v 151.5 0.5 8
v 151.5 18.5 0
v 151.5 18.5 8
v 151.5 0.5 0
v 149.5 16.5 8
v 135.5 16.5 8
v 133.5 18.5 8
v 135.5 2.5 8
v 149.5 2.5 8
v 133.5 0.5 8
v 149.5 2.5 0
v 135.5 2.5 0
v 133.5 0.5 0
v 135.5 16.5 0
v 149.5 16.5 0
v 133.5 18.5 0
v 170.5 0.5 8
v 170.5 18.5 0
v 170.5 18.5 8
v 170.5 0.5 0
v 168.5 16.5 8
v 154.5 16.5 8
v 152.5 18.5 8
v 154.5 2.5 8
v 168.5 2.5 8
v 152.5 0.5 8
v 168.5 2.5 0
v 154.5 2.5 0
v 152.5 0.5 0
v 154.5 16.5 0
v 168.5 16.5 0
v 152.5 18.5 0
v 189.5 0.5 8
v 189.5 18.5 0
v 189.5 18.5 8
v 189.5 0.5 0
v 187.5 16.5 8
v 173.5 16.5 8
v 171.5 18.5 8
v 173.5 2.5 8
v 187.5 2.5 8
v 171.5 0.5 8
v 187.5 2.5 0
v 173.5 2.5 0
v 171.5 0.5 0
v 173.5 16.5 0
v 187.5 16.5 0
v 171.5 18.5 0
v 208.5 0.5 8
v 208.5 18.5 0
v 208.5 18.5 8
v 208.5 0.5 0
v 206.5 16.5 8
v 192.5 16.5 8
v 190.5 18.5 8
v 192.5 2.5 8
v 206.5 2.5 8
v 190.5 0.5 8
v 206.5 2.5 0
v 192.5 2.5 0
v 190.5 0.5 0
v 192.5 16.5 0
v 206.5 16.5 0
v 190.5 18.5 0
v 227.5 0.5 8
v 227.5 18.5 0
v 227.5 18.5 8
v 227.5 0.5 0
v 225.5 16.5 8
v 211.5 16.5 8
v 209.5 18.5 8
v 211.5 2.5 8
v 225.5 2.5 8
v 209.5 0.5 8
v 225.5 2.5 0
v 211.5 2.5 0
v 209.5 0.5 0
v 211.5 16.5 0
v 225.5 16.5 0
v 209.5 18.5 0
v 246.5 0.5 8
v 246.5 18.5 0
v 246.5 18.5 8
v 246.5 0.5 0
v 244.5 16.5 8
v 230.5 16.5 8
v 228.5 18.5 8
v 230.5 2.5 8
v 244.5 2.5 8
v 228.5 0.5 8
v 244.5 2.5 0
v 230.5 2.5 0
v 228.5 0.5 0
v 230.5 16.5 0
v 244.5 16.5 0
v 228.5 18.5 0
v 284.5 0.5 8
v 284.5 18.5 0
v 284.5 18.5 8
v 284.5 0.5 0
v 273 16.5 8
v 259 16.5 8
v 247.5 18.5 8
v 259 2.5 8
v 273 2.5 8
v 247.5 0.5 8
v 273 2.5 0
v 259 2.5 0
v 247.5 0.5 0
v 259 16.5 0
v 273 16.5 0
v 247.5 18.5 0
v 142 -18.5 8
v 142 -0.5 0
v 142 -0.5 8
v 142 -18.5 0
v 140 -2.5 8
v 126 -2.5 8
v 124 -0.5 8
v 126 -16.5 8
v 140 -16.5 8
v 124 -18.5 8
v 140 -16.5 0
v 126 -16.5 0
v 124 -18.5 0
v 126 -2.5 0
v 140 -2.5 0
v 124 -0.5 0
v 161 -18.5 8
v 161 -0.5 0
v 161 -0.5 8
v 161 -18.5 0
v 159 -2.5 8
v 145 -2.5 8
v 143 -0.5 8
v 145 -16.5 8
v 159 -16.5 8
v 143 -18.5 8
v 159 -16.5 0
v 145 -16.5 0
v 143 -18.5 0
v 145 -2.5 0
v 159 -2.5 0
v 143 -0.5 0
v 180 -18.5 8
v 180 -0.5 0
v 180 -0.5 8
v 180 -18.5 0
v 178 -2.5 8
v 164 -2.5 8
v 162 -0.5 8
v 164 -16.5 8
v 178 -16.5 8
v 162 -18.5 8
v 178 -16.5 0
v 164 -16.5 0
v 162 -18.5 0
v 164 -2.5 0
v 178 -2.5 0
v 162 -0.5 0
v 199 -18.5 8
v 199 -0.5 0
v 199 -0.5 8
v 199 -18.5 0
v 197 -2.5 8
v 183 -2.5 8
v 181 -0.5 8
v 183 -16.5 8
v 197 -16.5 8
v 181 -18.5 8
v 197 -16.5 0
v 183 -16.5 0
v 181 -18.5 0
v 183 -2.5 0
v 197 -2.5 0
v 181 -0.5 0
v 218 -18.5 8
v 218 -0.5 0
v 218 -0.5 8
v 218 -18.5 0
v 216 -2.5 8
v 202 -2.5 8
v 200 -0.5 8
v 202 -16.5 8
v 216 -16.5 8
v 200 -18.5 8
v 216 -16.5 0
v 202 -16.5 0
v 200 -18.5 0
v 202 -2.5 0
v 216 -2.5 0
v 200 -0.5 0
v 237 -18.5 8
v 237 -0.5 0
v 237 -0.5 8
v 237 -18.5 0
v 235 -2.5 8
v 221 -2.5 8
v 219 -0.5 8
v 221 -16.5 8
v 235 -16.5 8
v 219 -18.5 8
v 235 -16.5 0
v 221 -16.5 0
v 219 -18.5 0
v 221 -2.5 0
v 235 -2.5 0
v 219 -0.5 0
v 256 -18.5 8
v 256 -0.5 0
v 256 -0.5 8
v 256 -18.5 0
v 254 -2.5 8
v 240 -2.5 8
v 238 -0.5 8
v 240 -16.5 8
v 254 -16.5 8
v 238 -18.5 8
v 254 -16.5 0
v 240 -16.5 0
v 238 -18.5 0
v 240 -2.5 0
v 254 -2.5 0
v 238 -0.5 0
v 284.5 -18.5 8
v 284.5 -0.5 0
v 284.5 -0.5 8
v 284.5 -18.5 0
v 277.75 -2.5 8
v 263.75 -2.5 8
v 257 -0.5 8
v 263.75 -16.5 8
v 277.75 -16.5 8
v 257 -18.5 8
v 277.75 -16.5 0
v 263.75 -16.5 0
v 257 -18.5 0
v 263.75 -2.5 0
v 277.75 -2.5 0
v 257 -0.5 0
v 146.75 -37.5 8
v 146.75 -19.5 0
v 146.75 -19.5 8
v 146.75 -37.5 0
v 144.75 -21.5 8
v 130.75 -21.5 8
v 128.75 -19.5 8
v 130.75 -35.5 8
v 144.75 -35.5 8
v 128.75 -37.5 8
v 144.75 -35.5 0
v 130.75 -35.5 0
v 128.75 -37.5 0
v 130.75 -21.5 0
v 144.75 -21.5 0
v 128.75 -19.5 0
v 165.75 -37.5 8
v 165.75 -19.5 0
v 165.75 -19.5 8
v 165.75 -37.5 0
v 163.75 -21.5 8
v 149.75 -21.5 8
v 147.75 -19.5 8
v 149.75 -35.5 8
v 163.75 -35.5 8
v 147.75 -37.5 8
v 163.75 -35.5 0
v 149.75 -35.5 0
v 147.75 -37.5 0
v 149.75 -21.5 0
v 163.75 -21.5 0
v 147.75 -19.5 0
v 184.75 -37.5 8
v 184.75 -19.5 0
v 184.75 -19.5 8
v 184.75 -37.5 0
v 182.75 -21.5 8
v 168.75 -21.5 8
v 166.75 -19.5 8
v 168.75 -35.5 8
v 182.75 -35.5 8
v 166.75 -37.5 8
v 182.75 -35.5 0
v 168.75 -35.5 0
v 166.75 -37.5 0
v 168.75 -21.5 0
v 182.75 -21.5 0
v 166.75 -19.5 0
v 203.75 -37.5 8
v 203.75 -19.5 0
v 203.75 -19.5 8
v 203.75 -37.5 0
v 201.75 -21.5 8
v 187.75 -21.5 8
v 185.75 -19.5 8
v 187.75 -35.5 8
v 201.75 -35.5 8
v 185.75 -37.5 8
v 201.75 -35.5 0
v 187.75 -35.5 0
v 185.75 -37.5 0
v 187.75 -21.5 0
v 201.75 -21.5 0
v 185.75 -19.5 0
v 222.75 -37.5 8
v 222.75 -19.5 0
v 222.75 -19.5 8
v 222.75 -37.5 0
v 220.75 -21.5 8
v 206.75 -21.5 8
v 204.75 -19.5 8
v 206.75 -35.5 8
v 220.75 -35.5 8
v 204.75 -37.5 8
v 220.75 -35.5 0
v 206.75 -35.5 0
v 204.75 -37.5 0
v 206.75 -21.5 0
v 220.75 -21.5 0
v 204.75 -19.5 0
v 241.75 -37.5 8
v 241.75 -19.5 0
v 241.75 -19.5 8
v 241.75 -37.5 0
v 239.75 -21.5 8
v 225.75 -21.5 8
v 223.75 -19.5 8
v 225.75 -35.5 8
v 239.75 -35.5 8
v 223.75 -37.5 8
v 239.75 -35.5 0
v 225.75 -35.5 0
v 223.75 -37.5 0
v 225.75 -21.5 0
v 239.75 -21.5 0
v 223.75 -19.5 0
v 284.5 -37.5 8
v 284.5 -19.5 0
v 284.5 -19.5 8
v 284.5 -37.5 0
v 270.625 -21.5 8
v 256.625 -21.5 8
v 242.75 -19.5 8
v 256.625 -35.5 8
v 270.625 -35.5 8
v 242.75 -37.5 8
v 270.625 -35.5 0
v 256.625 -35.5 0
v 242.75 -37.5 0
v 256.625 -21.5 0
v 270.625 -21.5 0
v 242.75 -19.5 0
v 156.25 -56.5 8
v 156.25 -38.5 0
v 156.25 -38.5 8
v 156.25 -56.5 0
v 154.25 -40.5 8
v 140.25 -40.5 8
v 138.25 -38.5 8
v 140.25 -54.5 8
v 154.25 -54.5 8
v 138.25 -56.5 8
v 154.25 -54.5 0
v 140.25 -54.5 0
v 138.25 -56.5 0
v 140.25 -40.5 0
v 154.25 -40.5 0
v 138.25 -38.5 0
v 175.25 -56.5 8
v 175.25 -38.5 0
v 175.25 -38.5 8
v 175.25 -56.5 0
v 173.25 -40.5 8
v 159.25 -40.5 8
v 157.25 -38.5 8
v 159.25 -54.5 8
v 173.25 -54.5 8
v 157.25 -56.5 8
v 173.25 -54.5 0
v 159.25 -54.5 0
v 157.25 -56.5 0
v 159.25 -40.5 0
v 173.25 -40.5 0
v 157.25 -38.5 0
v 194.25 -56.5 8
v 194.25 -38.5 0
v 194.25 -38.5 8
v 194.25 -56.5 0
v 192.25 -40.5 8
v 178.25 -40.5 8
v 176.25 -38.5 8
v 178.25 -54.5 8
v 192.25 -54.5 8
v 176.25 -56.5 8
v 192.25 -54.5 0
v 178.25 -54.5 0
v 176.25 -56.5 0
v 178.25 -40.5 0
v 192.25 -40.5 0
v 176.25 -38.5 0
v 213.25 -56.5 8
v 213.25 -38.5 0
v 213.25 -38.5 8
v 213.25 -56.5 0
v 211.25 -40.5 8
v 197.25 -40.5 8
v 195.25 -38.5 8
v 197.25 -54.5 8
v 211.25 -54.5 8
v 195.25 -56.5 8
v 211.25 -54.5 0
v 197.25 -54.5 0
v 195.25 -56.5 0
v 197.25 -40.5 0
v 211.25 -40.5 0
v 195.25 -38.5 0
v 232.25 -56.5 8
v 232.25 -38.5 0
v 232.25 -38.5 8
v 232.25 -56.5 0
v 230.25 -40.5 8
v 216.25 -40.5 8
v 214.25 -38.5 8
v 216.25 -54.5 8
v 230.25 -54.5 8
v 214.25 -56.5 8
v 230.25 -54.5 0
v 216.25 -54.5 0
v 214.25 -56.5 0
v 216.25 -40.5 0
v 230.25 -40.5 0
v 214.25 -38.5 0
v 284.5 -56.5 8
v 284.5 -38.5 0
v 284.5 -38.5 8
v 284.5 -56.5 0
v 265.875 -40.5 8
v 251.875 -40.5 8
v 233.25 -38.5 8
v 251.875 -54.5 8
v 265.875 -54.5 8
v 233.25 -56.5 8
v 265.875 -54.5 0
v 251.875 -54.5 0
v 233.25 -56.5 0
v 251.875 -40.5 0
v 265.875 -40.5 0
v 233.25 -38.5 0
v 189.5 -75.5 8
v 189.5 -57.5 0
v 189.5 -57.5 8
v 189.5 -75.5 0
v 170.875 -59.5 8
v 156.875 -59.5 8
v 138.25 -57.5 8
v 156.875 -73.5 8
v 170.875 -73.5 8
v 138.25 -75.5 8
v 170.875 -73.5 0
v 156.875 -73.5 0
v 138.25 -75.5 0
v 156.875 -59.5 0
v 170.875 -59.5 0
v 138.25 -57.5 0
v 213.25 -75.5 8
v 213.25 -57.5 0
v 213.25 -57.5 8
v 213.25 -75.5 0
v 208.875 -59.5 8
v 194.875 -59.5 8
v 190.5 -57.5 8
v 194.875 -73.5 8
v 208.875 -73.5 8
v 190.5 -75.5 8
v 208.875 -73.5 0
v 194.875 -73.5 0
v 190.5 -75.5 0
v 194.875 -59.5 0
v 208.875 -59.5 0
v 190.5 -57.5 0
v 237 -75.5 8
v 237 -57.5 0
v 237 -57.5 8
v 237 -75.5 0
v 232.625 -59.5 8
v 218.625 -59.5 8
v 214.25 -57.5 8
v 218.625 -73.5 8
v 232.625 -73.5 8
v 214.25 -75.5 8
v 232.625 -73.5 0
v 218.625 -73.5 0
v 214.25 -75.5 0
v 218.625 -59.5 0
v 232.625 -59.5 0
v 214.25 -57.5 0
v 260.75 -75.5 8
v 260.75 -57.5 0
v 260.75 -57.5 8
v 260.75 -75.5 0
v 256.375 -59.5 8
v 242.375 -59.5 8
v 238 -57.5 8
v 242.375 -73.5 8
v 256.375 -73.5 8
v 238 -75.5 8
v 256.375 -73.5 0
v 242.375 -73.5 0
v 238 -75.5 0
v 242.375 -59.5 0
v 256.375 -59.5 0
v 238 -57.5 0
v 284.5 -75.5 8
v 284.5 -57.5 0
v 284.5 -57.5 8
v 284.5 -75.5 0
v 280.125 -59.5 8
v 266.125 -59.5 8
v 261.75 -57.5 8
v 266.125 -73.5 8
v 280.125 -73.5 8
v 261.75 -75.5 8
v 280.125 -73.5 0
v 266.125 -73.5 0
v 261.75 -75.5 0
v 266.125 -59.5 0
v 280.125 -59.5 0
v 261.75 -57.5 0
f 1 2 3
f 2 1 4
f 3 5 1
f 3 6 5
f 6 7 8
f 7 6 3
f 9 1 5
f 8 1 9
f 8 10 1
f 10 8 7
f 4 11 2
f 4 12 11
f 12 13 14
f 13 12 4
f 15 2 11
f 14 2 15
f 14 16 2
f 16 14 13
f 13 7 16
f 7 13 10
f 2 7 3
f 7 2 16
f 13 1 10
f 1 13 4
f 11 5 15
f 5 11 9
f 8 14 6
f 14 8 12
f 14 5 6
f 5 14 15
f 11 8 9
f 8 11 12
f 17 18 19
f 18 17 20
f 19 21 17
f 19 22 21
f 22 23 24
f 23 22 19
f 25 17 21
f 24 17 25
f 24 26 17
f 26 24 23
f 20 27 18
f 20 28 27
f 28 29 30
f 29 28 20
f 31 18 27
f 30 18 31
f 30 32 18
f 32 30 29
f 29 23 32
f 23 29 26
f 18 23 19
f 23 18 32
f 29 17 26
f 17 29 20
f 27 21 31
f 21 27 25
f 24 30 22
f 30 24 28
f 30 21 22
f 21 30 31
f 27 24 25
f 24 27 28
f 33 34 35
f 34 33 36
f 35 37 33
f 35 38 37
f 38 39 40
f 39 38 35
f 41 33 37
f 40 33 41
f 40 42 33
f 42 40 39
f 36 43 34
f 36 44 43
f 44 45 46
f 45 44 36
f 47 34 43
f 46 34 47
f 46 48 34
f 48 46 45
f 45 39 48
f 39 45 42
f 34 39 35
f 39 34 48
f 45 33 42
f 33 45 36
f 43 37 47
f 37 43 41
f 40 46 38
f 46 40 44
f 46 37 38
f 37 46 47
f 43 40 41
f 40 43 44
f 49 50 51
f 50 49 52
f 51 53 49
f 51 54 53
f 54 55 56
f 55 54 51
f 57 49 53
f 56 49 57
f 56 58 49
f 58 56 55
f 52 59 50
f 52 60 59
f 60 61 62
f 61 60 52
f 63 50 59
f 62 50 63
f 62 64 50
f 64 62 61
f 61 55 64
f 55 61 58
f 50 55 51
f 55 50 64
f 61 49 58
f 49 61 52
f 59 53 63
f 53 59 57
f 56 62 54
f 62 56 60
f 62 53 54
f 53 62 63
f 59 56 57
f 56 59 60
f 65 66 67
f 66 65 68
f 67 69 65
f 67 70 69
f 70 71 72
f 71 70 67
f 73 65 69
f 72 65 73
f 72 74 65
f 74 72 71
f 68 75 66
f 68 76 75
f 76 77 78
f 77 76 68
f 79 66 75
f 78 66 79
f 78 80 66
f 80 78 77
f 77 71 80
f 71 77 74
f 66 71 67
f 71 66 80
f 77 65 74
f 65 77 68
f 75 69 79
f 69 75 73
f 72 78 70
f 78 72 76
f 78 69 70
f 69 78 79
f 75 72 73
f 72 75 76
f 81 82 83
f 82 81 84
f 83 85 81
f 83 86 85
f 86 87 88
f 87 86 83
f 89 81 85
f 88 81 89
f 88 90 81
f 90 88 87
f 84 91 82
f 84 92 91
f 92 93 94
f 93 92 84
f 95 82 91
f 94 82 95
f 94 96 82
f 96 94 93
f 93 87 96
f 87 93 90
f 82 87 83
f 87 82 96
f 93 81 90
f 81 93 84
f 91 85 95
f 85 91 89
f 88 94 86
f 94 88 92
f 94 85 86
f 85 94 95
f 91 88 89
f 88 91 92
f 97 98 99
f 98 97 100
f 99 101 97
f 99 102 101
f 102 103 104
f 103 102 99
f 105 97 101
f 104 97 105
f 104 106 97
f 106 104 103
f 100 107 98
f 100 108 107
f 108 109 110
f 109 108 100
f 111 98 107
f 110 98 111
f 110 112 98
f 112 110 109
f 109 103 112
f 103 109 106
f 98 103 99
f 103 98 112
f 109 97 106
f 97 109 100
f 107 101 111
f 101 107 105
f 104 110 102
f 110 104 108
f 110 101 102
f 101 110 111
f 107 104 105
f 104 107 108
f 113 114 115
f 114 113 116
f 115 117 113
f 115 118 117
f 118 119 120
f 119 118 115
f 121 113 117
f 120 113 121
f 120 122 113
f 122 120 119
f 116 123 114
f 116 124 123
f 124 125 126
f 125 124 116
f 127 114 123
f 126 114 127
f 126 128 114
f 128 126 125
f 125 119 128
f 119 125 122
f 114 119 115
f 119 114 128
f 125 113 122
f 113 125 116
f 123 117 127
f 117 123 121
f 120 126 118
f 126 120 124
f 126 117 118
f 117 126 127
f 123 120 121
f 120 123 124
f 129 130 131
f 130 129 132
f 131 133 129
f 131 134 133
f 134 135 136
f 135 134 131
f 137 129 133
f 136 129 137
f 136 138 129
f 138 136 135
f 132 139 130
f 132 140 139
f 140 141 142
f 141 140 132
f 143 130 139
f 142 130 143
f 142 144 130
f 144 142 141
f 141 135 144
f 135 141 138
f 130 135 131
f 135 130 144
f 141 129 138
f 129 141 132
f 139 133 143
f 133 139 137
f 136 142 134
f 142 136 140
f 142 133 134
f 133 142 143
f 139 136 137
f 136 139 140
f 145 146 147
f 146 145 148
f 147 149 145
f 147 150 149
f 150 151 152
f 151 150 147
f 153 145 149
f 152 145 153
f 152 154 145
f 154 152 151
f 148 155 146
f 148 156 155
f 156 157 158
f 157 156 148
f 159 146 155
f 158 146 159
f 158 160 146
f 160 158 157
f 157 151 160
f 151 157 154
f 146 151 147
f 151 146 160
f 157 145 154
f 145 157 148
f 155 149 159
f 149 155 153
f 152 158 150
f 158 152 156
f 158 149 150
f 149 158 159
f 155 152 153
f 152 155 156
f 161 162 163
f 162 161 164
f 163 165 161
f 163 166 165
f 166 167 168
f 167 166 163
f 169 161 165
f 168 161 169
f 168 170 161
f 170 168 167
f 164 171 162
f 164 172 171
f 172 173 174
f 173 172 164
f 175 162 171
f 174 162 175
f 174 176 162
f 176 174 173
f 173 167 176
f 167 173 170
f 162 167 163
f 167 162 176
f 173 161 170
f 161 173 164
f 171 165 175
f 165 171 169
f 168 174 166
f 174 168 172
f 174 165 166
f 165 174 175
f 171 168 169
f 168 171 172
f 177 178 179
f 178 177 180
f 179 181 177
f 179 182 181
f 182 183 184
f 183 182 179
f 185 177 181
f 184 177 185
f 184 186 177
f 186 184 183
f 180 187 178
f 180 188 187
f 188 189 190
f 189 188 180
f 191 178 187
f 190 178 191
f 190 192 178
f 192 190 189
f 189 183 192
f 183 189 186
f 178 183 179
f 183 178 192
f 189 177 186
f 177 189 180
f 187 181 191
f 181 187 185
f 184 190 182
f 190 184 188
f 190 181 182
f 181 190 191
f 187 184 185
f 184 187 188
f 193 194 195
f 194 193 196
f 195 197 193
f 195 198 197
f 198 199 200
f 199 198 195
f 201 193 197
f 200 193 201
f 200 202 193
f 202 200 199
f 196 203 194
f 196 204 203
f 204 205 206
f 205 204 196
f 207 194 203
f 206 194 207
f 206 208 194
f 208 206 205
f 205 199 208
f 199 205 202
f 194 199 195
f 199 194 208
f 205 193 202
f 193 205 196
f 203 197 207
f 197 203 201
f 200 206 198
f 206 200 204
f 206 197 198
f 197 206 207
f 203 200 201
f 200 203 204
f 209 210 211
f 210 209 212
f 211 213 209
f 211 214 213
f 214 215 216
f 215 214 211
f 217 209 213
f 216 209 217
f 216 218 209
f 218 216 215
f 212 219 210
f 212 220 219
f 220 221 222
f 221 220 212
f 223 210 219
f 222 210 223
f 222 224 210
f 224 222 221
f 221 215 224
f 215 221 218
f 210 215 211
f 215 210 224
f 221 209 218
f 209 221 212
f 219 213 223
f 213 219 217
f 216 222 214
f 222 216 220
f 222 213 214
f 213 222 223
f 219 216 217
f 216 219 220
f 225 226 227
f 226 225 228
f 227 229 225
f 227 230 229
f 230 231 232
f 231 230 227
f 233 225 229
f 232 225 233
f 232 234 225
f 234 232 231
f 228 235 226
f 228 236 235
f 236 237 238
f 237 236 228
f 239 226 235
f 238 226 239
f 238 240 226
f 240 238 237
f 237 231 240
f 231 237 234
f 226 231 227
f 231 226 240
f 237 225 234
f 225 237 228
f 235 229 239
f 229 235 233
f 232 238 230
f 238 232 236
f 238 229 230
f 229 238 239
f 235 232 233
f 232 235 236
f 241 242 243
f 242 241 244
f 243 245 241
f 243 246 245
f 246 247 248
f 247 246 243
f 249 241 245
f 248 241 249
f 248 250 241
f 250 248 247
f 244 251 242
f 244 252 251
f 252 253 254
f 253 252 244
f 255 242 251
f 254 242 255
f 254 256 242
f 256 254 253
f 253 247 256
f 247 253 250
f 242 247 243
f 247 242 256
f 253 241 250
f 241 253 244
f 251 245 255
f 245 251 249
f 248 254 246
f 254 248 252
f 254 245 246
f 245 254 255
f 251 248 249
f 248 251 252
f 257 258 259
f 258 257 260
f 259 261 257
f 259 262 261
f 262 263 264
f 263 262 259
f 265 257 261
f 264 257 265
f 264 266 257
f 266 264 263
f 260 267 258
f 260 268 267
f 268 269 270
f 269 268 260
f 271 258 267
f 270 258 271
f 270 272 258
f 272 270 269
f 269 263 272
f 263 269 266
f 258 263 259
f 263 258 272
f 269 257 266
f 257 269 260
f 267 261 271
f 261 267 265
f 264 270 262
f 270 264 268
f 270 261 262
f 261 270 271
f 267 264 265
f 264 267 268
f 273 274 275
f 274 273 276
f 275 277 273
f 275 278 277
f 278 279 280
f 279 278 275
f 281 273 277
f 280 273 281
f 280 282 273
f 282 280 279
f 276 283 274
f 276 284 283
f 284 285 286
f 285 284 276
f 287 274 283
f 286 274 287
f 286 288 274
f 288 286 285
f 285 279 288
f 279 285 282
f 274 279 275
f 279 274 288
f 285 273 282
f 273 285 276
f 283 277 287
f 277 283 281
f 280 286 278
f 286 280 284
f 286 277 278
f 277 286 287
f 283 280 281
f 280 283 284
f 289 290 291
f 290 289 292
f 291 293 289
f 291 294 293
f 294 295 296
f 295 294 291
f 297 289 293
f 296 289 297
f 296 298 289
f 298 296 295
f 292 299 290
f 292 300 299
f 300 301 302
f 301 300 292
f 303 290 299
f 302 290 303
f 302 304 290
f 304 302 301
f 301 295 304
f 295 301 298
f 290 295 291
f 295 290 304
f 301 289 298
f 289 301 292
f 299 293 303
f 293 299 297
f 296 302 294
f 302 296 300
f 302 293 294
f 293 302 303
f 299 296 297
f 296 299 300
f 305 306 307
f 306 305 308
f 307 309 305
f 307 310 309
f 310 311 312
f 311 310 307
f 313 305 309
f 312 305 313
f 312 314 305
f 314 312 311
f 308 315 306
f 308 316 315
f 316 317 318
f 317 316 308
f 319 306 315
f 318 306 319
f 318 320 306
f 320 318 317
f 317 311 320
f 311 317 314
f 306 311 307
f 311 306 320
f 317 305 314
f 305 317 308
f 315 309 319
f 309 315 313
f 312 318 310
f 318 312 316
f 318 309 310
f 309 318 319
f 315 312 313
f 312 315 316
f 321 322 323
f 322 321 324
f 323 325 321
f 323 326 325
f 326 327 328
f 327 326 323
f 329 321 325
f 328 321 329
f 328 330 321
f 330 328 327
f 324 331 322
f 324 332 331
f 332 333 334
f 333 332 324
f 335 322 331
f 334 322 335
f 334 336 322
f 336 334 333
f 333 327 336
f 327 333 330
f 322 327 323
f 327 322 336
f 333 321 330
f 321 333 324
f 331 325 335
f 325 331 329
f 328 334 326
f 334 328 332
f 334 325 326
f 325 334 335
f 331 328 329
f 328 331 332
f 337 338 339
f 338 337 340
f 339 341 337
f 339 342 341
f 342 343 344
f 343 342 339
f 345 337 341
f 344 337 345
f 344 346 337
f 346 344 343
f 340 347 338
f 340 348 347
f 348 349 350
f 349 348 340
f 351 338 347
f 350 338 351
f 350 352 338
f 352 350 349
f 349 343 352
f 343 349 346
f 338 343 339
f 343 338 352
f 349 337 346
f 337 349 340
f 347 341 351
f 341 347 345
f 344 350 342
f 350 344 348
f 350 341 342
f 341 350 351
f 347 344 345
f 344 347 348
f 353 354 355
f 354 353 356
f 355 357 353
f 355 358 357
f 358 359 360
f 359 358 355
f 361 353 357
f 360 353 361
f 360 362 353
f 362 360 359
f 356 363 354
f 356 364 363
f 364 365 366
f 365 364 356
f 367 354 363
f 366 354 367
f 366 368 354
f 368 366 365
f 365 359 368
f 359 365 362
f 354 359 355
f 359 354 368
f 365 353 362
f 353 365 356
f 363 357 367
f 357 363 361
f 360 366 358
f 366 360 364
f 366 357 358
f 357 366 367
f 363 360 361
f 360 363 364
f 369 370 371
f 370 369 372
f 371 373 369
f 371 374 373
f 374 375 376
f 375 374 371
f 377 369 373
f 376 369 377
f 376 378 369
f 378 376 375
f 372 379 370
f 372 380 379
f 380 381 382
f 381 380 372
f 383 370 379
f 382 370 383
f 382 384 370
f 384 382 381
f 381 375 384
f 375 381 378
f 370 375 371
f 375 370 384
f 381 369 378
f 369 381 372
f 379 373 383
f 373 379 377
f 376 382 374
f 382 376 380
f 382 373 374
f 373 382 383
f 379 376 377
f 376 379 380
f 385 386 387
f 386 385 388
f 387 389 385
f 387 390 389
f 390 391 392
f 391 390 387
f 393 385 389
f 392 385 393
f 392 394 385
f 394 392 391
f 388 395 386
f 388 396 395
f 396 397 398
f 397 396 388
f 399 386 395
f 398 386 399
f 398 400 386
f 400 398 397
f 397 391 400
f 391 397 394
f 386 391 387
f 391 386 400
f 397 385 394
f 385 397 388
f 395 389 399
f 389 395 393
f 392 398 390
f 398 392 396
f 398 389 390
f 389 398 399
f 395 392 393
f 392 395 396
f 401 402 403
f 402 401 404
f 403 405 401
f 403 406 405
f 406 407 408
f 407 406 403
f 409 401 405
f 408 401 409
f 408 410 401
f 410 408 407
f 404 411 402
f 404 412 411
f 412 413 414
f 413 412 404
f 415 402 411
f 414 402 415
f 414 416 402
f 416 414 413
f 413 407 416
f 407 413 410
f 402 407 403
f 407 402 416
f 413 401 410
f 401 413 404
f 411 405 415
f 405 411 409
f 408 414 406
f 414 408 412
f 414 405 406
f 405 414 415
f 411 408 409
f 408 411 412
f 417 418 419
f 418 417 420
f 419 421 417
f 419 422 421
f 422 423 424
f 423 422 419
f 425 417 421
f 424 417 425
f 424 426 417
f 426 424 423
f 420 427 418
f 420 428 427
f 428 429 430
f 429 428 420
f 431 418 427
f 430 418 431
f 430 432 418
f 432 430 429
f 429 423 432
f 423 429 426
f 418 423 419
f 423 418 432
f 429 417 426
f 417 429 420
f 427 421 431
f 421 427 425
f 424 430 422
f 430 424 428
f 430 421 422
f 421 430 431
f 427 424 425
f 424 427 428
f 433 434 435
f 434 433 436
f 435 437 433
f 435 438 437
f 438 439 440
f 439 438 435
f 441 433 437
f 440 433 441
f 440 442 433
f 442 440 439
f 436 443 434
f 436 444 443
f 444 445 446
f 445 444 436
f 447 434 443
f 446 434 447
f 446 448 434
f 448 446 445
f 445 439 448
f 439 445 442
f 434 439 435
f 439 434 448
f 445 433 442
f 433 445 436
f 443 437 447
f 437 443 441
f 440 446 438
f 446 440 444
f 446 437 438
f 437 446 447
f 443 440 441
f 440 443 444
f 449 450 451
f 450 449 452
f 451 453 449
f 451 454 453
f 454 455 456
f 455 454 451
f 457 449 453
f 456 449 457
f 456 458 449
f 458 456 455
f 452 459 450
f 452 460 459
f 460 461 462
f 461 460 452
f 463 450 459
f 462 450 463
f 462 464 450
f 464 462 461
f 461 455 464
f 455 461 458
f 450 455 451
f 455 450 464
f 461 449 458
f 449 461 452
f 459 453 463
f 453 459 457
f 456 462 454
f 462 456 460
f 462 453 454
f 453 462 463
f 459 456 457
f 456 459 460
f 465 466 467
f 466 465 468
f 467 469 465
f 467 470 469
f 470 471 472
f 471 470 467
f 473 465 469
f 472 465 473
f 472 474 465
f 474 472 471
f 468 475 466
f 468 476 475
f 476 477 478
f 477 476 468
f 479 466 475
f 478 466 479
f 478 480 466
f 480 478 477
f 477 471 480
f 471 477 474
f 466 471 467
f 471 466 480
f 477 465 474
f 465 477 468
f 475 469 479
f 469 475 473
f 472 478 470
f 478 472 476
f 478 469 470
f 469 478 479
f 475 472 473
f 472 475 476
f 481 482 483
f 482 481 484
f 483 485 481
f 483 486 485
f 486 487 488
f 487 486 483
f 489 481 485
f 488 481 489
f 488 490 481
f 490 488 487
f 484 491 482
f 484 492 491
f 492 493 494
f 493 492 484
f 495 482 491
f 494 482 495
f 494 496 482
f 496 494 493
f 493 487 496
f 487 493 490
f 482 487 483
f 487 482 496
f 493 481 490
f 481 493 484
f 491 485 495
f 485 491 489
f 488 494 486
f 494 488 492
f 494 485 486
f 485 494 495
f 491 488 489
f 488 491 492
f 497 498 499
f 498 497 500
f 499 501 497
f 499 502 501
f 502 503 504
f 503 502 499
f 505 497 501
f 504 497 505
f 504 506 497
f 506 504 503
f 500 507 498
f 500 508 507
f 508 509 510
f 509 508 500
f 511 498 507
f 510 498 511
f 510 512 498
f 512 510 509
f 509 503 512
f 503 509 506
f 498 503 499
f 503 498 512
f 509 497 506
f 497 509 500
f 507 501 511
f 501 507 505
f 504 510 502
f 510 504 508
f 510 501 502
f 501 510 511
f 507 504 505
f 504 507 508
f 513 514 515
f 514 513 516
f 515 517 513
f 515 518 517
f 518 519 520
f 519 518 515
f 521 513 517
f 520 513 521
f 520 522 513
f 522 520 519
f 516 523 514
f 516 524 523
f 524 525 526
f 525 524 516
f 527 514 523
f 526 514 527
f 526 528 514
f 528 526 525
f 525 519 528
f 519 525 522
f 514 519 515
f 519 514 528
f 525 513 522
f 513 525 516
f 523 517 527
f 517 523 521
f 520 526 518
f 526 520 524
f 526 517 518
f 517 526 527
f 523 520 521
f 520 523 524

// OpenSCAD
// Keyboard Layout Visualization in OpenSCAD

// --- Constants ---
u = 19;         // Standard key unit size (mm)
gap = 1;        // Gap between keys (actual key dimension = u - gap)
key_height = 8; // Height of the keycap base
text_depth = 0.5; // How much the text sticks out from the surface
text_size = 3.5;  // Font size for legends
key_color = [0.8, 0.8, 0.8]; // Light grey for keycaps
text_color = [0.1, 0.1, 0.1]; // Dark grey/black for text
font = "Liberation Sans:style=Bold"; // Choose a font available on your system

// --- Key Data ---
// Format: [ TopLegend, BottomLegend, x_start_units, y_row_index, width_units ]
// Derived from the input structure.
key_data = [
  // Row 0 (y=0) - Function/Number Row
  [ "~", "`", 0, 0, 1 ], [ "!", "1", 1, 0, 1 ], [ "@", "2", 2, 0, 1 ], [ "#", "3", 3, 0, 1 ], [ "$", "4", 4, 0, 1 ], [ "%", "5", 5, 0, 1 ], [ "^", "6", 6, 0, 1 ], [ "&", "7", 7, 0, 1 ], [ "*", "8", 8, 0, 1 ], [ "(", "9", 9, 0, 1 ], [ ")", "0", 10, 0, 1 ], [ "_", "-", 11, 0, 1 ], [ "+", "=", 12, 0, 1 ], [ "", "Backspace", 13, 0, 2 ],
  // Row 1 (y=-1) - QWERTY Row
  [ "", "Tab", 0, -1, 1.5 ], [ "", "Q", 1.5, -1, 1 ], [ "", "W", 2.5, -1, 1 ], [ "", "E", 3.5, -1, 1 ], [ "", "R", 4.5, -1, 1 ], [ "", "T", 5.5, -1, 1 ], [ "", "Y", 6.5, -1, 1 ], [ "", "U", 7.5, -1, 1 ], [ "", "I", 8.5, -1, 1 ], [ "", "O", 9.5, -1, 1 ], [ "", "P", 10.5, -1, 1 ], [ "{", "[", 11.5, -1, 1 ], [ "}", "]", 12.5, -1, 1 ], [ "|", "\\", 13.5, -1, 1.5 ],
  // Row 2 (y=-2) - ASDF Row (Home)
  [ "", "Caps Lock", 0, -2, 1.75 ], [ "", "A", 1.75, -2, 1 ], [ "", "S", 2.75, -2, 1 ], [ "", "D", 3.75, -2, 1 ], [ "", "F", 4.75, -2, 1 ], [ "", "G", 5.75, -2, 1 ], [ "", "H", 6.75, -2, 1 ], [ "", "J", 7.75, -2, 1 ], [ "", "K", 8.75, -2, 1 ], [ "", "L", 9.75, -2, 1 ], [ ":", ";", 10.75, -2, 1 ], [ "\"", "'", 11.75, -2, 1 ], [ "", "Enter", 12.75, -2, 2.25 ],
  // Row 3 (y=-3) - ZXCV Row
  [ "", "Shift", 0, -3, 2.25 ], [ "", "Z", 2.25, -3, 1 ], [ "", "X", 3.25, -3, 1 ], [ "", "C", 4.25, -3, 1 ], [ "", "V", 5.25, -3, 1 ], [ "", "B", 6.25, -3, 1 ], [ "", "N", 7.25, -3, 1 ], [ "", "M", 8.25, -3, 1 ], [ "<", ",", 9.25, -3, 1 ], [ ">", ".", 10.25, -3, 1 ], [ "?", "/", 11.25, -3, 1 ], [ "", "Shift", 12.25, -3, 2.75 ],
  // Row 4 (y=-4) - Bottom Modifiers Row
  [ "", "Ctrl", 0, -4, 1.25 ], [ "", "Win", 1.25, -4, 1.25 ], [ "", "Alt", 2.5, -4, 1.25 ], [ "", "", 3.75, -4, 6.25 ], // Space bar (no legend)
  [ "", "Alt", 10, -4, 1.25 ], [ "", "Win", 11.25, -4, 1.25 ], [ "", "Menu", 12.5, -4, 1.25 ], [ "", "Ctrl", 13.75, -4, 1.25 ]
];

// --- Module to draw a single keycap ---
module keycap(top_lg = "", btm_lg = "", width_u = 1, depth_u = 1, pos = [0,0,0]) {
    key_w = width_u * u - gap;
    key_d = depth_u * u - gap;

    // Calculate center position for the key relative to its bottom-left corner (pos)
    center_x = pos[0] + (width_u * u / 2);
    center_y = pos[1] + (depth_u * u / 2); // OpenSCAD Y is depth
    center_z = pos[2] + key_height / 2;

    // Position for text on top surface
    text_pos_z = pos[2] + key_height + 0.01; // Place slightly above surface

    translate([center_x, center_y, center_z]) {
        // Keycap Base
        color(key_color)
            cube([key_w, key_d, key_height], center=true);

        // Determine Legend Positions
        has_top = (top_lg != "");
        has_btm = (btm_lg != "");
        text_y_offset = (has_top && has_btm) ? key_d * 0.22 : 0; // Offset for two lines
        btm_text_y = (has_top && has_btm) ? -text_y_offset : 0;
        top_text_y = (has_btm && has_top) ? text_y_offset : (has_top ? 0 : btm_text_y); // Center single legend

        // Bottom Legend Text
        if (has_btm) {
            translate([0, btm_text_y, key_height/2 + text_depth/2]) // Adjusted Z for text depth
            color(text_color)
            linear_extrude(height = text_depth, center=true) // Extrude text
                text(btm_lg, size = text_size, halign = "center", valign = "center", font = font);
        }

        // Top Legend Text
        if (has_top) {
             translate([0, top_text_y, key_height/2 + text_depth/2]) // Adjusted Z for text depth
             color(text_color)
             linear_extrude(height = text_depth, center=true) // Extrude text
                text(top_lg, size = text_size, halign = "center", valign = "center", font = font);
        }
    }
}


// --- Main part - Generate all keys ---
module keyboard() {
     for (key = key_data) {
        top_lg = key[0];
        btm_lg = key[1];
        x_pos_u = key[2];
        y_row_idx = key[3]; // Use negative index directly
        width_u = key[4];

        // Calculate bottom-left position for the key
        // We use negative Y to match screen coordinates (top row is y=0)
        key_pos = [ x_pos_u * u, y_row_idx * u, 0 ];

        keycap(top_lg, btm_lg, width_u, 1, key_pos); // Assuming depth_u is always 1
    }
}



// --- Render the keyboard ---
keyboard();

// Optional: Add a base plate (uncomment to see)
/*
 module base_plate(rows=5, total_width_u=15) {
     plate_width = total_width_u * u + gap;
     plate_depth = rows * u + gap;
     plate_thickness = 2;
     
     translate([-gap/2, - (rows * u) + u - gap/2, -plate_thickness]) {
        color([0.3, 0.3, 0.3]) 
            cube([plate_width, plate_depth, plate_thickness]);
     }
 }
 
 base_plate(5, 15); // Adjust parameters if layout changes significantly
*/



// Keyboard Layout Visualization in OpenSCAD - Left Hand Keys Only

// --- Constants ---
u = 19;         // Standard key unit size (mm)
gap = 1;        // Gap between keys (actual key dimension = u - gap)
key_height = 8; // Height of the keycap base
key_color = [0.8, 0.8, 0.8]; // Light grey for keycaps
hole_size = 14; // Size of the square hole side (mm)

// --- Left Hand Key Data ---
// Format: [ "", "", x_start_units, y_row_index, width_units ]
// Contains only keys typically typed by the left hand.
left_key_data = [
  // Row 0 (y=0)
  [ "", "", 0, 0, 1 ], [ "", "", 1, 0, 1 ], [ "", "", 2, 0, 1 ], [ "", "", 3, 0, 1 ], [ "", "", 4, 0, 1 ], [ "", "", 5, 0, 1 ], [ "", "", 6, 0, 1 ],
  // Row 1 (y=-1)
  [ "", "", 0, -1, 1.5 ], [ "", "", 1.5, -1, 1 ], [ "", "", 2.5, -1, 1 ], [ "", "", 3.5, -1, 1 ], [ "", "", 4.5, -1, 1 ], [ "", "", 5.5, -1, 1 ],
  // Row 2 (y=-2)
  [ "", "", 0, -2, 1.75 ], [ "", "", 1.75, -2, 1 ], [ "", "", 2.75, -2, 1 ], [ "", "", 3.75, -2, 1 ], [ "", "", 4.75, -2, 1 ], [ "", "", 5.75, -2, 1 ],
  // Row 3 (y=-3)
  [ "", "", 0, -3, 2.25 ], [ "", "", 2.25, -3, 1 ], [ "", "", 3.25, -3, 1 ], [ "", "", 4.25, -3, 1 ], [ "", "", 5.25, -3, 1 ], [ "", "", 6.25, -3, 1 ],
  // Row 4 (y=-4)
  [ "", "", 0, -4, 1.25 ], [ "", "", 1.25, -4, 1.25 ], [ "", "", 2.5, -4, 1.25 ],
  [ "", "", 3.75, -4, 3.5 ] // Left part of Space bar
];

// --- Module to draw a single keycap ---
module keycap(width_u = 1, depth_u = 1, pos = [0,0,0]) {
    key_w = width_u * u - gap;
    key_d = depth_u * u - gap;

    // Calculate center position for the key relative to its bottom-left corner (pos)
    center_x = pos[0] + (width_u * u / 2);
    center_y = pos[1] + (depth_u * u / 2); // OpenSCAD Y is depth
    center_z = pos[2] + key_height / 2;

    translate([center_x, center_y, center_z]) {
        // Use difference() to subtract the hole from the keycap base
        difference() {
            // Keycap Base Cube
            color(key_color)
                cube([key_w, key_d, key_height], center=true);

            // Square prism (cube) for the hole
            // Make it slightly taller than key_height to ensure clean cut
            cube([hole_size, hole_size, key_height + 2], center=true);
        }
    }
}


// --- Main part - Generate Left Hand keys ---
module keyboard() {
     // Iterate over the left_key_data only
     for (key = left_key_data) {
        x_pos_u = key[2];
        y_row_idx = key[3]; // Use negative index directly
        width_u = key[4];

        // Calculate bottom-left position for the key
        key_pos = [ x_pos_u * u, y_row_idx * u, 0 ];

        // Call keycap
        keycap(width_u, 1, key_pos); // Assuming depth_u is always 1
    }
}

// --- Render the keyboard ---
keyboard();

// Optional: Add a base plate (uncomment to see and adjust)
/*
 module base_plate(key_data_array, rows = 5) {
     min_x_u = min([for (k = key_data_array) k[2]]);
     max_x_u = max([for (k = key_data_array) k[2] + k[4]]);
     min_y_u = min([for (k = key_data_array) k[3]]); // Find the lowest row index
     max_y_u = max([for (k = key_data_array) k[3]]); // Should be 0 for the top row

     plate_width = (max_x_u - min_x_u) * u + gap;
     // Depth calculation needs care with negative indices
     plate_depth = (max_y_u - min_y_u + 1) * u + gap;
     plate_thickness = 2;
     origin_x = min_x_u * u - gap/2;
     origin_y = min_y_u * u - gap/2; // Start at the bottom edge of the lowest row

     translate([origin_x, origin_y, -plate_thickness]) {
        color([0.3, 0.3, 0.3])
            cube([plate_width, plate_depth, plate_thickness]);
     }
 }

 base_plate(left_key_data, 5); // Call base_plate with the left hand data
*/



// Keyboard Layout Visualization in OpenSCAD - Right Hand Keys Only

// --- Constants ---
u = 19;         // Standard key unit size (mm)
gap = 1;        // Gap between keys (actual key dimension = u - gap)
key_height = 8; // Height of the keycap base
key_color = [0.8, 0.8, 0.8]; // Light grey for keycaps
hole_size = 14; // Size of the square hole side (mm)

// --- Right Hand Key Data ---
// Format: [ "", "", x_start_units, y_row_index, width_units ]
// Contains only keys typically typed by the right hand.
right_key_data = [
  // Row 0 (y=0)
  [ "", "", 7, 0, 1 ], [ "", "", 8, 0, 1 ], [ "", "", 9, 0, 1 ], [ "", "", 10, 0, 1 ], [ "", "", 11, 0, 1 ], [ "", "", 12, 0, 1 ], [ "", "", 13, 0, 2 ],
  // Row 1 (y=-1)
  [ "", "", 6.5, -1, 1 ], [ "", "", 7.5, -1, 1 ], [ "", "", 8.5, -1, 1 ], [ "", "", 9.5, -1, 1 ], [ "", "", 10.5, -1, 1 ], [ "", "", 11.5, -1, 1 ], [ "", "", 12.5, -1, 1 ], [ "", "", 13.5, -1, 1.5 ],
  // Row 2 (y=-2)
  [ "", "", 6.75, -2, 1 ], [ "", "", 7.75, -2, 1 ], [ "", "", 8.75, -2, 1 ], [ "", "", 9.75, -2, 1 ], [ "", "", 10.75, -2, 1 ], [ "", "", 11.75, -2, 1 ], [ "", "", 12.75, -2, 2.25 ],
  // Row 3 (y=-3)
  [ "", "", 7.25, -3, 1 ], [ "", "", 8.25, -3, 1 ], [ "", "", 9.25, -3, 1 ], [ "", "", 10.25, -3, 1 ], [ "", "", 11.25, -3, 1 ], [ "", "", 12.25, -3, 2.75 ],
  // Row 4 (y=-4)
  [ "", "", 7.25, -4, 2.75 ], // Right part of Space bar (original start 3.75 + left width 3.5 = 7.25)
  [ "", "", 10, -4, 1.25 ], [ "", "", 11.25, -4, 1.25 ], [ "", "", 12.5, -4, 1.25 ], [ "", "", 13.75, -4, 1.25 ]
];


// --- Module to draw a single keycap ---
module keycap(width_u = 1, depth_u = 1, pos = [0,0,0]) {
    key_w = width_u * u - gap;
    key_d = depth_u * u - gap;

    // Calculate center position for the key relative to its bottom-left corner (pos)
    center_x = pos[0] + (width_u * u / 2);
    center_y = pos[1] + (depth_u * u / 2); // OpenSCAD Y is depth
    center_z = pos[2] + key_height / 2;

    translate([center_x, center_y, center_z]) {
        // Use difference() to subtract the hole from the keycap base
        difference() {
            // Keycap Base Cube
            color(key_color)
                cube([key_w, key_d, key_height], center=true);

            // Square prism (cube) for the hole
            // Make it slightly taller than key_height to ensure clean cut
            cube([hole_size, hole_size, key_height + 2], center=true);
        }
    }
}


// --- Main part - Generate Right Hand keys ---
module keyboard() {
     // Iterate over the right_key_data only
     for (key = right_key_data) {
        x_pos_u = key[2];
        y_row_idx = key[3]; // Use negative index directly
        width_u = key[4];

        // Calculate bottom-left position for the key
        key_pos = [ x_pos_u * u, y_row_idx * u, 0 ];

        // Call keycap
        keycap(width_u, 1, key_pos); // Assuming depth_u is always 1
    }
}

// --- Render the keyboard ---
keyboard();

// Optional: Add a base plate (uncomment to see and adjust)
/*
 module base_plate(key_data_array, rows = 5) {
     min_x_u = min([for (k = key_data_array) k[2]]);
     max_x_u = max([for (k = key_data_array) k[2] + k[4]]);
     min_y_u = min([for (k = key_data_array) k[3]]); // Find the lowest row index
     max_y_u = max([for (k = key_data_array) k[3]]); // Should be 0 for the top row

     plate_width = (max_x_u - min_x_u) * u + gap;
     // Depth calculation needs care with negative indices
     plate_depth = (max_y_u - min_y_u + 1) * u + gap;
     plate_thickness = 2;
     origin_x = min_x_u * u - gap/2;
     origin_y = min_y_u * u - gap/2; // Start at the bottom edge of the lowest row

     translate([origin_x, origin_y, -plate_thickness]) {
        color([0.3, 0.3, 0.3])
            cube([plate_width, plate_depth, plate_thickness]);
     }
 }

 base_plate(right_key_data, 5); // Call base_plate with the right hand data
*/
